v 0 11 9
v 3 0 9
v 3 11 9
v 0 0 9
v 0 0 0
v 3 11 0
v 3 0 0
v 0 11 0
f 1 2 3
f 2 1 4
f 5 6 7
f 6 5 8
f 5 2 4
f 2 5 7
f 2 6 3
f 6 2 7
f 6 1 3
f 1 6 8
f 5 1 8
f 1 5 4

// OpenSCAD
// Generated by SolidPython 1.0.1 on 2020-07-29 00:46:54


cube(size = [3, 11, 9]);
/***********************************************
*********      SolidPython code:      **********
************************************************
 
# import packages: SolidPython
from solid import *
from solid.utils import *
from itertools import chain, combinations, permutations


class Resize:

    def __init__(self, scad_file):
        self.scad_file = scad_file
        #self.scad_file = import_scad(scad_file)
        # cone/cylinder param:
        self.r1 = 0
        self.r2 = 0
        self.h = 0
        # rectangular prism param:
        self.w = 0
        self.l = 0
        # ellipse param:
        self.r = 0

    # import OpenScad code (file name corresponds to shape)


    # classify shape + parameters
    def assign(self, param1, param2, param3):
        if self.scad_file == 'cone.scad':
            self.r1 = param1
            self.r2 = param2
            self.h = param3
        elif self.scad_file == 'cylinder.scad':
            self.r1 = param1
            self.r2 = param2
            self.h = param3
        elif self.scad_file == 'rectangularPrism.scad':
            self.h = param1
            self.l = param2
            self.w = param3
        else:
            self.r = param1
            self.h = param2

    # resize parameters
    def iterate(self):
        x = range(3, 20, 2)
        i = 1
        if self.scad_file == 'cone.scad':
            tempList = list(permutations(x, 2))
            for temp in tempList:
                param1 = temp[0]
                param2 = temp[1]
                filepath = 'produced_scad_files/' + 'cone' + str(param1) + '_' + str(param2) + '_' + '.scad'
                scad_render_to_file(cylinder(h=param1, r1=param2, r2=0), filepath)

        elif self.scad_file == 'cylinder.scad':
            tempList = list(permutations(x, 3))
            for temp in tempList:
                param1 = temp[0]
                param2 = temp[1]
                filepath = 'produced_scad_files/' + 'cylinder' + str(param1) + '_' + str(param2) + '_' + '.scad'
                scad_render_to_file(cylinder(h=param1, r1=param2, r2=param2), filepath)

        elif self.scad_file == 'rectangularPrism.scad':
            tempList = list(permutations(x, 3))
            for temp in tempList:
                param1 = temp[0]
                param2 = temp[1]
                param3 = temp[2]
                filepath = 'produced_scad_files/' + 'rectangularPrism' + str(param1) + '_' + str(param2) + '_' + str(
                    param3) + '.scad'
                scad_render_to_file(cube(size=(param1, param2, param3)), filepath)

        elif self.scad_file == 'ellipse.scad':
            tempList = list(permutations(x, 4))
            for temp in tempList:
                param1 = temp[0]
                param2 = temp[1]
                param3 = temp[2]
                param4 = temp[3]
                filepath = 'produced_scad_files/' + 'ellipse' + str(param1) + '_' + str(param2) + '_' + str(param3) + '_' + str(param4) + '.scad'
                scad_render_to_file(scale([param1, param2, param3])(sphere(r=param4)), filepath)

    def render_to_scadfile(self):
        scad_render_to_file(scad, 'example.scad') 
 
************************************************/
